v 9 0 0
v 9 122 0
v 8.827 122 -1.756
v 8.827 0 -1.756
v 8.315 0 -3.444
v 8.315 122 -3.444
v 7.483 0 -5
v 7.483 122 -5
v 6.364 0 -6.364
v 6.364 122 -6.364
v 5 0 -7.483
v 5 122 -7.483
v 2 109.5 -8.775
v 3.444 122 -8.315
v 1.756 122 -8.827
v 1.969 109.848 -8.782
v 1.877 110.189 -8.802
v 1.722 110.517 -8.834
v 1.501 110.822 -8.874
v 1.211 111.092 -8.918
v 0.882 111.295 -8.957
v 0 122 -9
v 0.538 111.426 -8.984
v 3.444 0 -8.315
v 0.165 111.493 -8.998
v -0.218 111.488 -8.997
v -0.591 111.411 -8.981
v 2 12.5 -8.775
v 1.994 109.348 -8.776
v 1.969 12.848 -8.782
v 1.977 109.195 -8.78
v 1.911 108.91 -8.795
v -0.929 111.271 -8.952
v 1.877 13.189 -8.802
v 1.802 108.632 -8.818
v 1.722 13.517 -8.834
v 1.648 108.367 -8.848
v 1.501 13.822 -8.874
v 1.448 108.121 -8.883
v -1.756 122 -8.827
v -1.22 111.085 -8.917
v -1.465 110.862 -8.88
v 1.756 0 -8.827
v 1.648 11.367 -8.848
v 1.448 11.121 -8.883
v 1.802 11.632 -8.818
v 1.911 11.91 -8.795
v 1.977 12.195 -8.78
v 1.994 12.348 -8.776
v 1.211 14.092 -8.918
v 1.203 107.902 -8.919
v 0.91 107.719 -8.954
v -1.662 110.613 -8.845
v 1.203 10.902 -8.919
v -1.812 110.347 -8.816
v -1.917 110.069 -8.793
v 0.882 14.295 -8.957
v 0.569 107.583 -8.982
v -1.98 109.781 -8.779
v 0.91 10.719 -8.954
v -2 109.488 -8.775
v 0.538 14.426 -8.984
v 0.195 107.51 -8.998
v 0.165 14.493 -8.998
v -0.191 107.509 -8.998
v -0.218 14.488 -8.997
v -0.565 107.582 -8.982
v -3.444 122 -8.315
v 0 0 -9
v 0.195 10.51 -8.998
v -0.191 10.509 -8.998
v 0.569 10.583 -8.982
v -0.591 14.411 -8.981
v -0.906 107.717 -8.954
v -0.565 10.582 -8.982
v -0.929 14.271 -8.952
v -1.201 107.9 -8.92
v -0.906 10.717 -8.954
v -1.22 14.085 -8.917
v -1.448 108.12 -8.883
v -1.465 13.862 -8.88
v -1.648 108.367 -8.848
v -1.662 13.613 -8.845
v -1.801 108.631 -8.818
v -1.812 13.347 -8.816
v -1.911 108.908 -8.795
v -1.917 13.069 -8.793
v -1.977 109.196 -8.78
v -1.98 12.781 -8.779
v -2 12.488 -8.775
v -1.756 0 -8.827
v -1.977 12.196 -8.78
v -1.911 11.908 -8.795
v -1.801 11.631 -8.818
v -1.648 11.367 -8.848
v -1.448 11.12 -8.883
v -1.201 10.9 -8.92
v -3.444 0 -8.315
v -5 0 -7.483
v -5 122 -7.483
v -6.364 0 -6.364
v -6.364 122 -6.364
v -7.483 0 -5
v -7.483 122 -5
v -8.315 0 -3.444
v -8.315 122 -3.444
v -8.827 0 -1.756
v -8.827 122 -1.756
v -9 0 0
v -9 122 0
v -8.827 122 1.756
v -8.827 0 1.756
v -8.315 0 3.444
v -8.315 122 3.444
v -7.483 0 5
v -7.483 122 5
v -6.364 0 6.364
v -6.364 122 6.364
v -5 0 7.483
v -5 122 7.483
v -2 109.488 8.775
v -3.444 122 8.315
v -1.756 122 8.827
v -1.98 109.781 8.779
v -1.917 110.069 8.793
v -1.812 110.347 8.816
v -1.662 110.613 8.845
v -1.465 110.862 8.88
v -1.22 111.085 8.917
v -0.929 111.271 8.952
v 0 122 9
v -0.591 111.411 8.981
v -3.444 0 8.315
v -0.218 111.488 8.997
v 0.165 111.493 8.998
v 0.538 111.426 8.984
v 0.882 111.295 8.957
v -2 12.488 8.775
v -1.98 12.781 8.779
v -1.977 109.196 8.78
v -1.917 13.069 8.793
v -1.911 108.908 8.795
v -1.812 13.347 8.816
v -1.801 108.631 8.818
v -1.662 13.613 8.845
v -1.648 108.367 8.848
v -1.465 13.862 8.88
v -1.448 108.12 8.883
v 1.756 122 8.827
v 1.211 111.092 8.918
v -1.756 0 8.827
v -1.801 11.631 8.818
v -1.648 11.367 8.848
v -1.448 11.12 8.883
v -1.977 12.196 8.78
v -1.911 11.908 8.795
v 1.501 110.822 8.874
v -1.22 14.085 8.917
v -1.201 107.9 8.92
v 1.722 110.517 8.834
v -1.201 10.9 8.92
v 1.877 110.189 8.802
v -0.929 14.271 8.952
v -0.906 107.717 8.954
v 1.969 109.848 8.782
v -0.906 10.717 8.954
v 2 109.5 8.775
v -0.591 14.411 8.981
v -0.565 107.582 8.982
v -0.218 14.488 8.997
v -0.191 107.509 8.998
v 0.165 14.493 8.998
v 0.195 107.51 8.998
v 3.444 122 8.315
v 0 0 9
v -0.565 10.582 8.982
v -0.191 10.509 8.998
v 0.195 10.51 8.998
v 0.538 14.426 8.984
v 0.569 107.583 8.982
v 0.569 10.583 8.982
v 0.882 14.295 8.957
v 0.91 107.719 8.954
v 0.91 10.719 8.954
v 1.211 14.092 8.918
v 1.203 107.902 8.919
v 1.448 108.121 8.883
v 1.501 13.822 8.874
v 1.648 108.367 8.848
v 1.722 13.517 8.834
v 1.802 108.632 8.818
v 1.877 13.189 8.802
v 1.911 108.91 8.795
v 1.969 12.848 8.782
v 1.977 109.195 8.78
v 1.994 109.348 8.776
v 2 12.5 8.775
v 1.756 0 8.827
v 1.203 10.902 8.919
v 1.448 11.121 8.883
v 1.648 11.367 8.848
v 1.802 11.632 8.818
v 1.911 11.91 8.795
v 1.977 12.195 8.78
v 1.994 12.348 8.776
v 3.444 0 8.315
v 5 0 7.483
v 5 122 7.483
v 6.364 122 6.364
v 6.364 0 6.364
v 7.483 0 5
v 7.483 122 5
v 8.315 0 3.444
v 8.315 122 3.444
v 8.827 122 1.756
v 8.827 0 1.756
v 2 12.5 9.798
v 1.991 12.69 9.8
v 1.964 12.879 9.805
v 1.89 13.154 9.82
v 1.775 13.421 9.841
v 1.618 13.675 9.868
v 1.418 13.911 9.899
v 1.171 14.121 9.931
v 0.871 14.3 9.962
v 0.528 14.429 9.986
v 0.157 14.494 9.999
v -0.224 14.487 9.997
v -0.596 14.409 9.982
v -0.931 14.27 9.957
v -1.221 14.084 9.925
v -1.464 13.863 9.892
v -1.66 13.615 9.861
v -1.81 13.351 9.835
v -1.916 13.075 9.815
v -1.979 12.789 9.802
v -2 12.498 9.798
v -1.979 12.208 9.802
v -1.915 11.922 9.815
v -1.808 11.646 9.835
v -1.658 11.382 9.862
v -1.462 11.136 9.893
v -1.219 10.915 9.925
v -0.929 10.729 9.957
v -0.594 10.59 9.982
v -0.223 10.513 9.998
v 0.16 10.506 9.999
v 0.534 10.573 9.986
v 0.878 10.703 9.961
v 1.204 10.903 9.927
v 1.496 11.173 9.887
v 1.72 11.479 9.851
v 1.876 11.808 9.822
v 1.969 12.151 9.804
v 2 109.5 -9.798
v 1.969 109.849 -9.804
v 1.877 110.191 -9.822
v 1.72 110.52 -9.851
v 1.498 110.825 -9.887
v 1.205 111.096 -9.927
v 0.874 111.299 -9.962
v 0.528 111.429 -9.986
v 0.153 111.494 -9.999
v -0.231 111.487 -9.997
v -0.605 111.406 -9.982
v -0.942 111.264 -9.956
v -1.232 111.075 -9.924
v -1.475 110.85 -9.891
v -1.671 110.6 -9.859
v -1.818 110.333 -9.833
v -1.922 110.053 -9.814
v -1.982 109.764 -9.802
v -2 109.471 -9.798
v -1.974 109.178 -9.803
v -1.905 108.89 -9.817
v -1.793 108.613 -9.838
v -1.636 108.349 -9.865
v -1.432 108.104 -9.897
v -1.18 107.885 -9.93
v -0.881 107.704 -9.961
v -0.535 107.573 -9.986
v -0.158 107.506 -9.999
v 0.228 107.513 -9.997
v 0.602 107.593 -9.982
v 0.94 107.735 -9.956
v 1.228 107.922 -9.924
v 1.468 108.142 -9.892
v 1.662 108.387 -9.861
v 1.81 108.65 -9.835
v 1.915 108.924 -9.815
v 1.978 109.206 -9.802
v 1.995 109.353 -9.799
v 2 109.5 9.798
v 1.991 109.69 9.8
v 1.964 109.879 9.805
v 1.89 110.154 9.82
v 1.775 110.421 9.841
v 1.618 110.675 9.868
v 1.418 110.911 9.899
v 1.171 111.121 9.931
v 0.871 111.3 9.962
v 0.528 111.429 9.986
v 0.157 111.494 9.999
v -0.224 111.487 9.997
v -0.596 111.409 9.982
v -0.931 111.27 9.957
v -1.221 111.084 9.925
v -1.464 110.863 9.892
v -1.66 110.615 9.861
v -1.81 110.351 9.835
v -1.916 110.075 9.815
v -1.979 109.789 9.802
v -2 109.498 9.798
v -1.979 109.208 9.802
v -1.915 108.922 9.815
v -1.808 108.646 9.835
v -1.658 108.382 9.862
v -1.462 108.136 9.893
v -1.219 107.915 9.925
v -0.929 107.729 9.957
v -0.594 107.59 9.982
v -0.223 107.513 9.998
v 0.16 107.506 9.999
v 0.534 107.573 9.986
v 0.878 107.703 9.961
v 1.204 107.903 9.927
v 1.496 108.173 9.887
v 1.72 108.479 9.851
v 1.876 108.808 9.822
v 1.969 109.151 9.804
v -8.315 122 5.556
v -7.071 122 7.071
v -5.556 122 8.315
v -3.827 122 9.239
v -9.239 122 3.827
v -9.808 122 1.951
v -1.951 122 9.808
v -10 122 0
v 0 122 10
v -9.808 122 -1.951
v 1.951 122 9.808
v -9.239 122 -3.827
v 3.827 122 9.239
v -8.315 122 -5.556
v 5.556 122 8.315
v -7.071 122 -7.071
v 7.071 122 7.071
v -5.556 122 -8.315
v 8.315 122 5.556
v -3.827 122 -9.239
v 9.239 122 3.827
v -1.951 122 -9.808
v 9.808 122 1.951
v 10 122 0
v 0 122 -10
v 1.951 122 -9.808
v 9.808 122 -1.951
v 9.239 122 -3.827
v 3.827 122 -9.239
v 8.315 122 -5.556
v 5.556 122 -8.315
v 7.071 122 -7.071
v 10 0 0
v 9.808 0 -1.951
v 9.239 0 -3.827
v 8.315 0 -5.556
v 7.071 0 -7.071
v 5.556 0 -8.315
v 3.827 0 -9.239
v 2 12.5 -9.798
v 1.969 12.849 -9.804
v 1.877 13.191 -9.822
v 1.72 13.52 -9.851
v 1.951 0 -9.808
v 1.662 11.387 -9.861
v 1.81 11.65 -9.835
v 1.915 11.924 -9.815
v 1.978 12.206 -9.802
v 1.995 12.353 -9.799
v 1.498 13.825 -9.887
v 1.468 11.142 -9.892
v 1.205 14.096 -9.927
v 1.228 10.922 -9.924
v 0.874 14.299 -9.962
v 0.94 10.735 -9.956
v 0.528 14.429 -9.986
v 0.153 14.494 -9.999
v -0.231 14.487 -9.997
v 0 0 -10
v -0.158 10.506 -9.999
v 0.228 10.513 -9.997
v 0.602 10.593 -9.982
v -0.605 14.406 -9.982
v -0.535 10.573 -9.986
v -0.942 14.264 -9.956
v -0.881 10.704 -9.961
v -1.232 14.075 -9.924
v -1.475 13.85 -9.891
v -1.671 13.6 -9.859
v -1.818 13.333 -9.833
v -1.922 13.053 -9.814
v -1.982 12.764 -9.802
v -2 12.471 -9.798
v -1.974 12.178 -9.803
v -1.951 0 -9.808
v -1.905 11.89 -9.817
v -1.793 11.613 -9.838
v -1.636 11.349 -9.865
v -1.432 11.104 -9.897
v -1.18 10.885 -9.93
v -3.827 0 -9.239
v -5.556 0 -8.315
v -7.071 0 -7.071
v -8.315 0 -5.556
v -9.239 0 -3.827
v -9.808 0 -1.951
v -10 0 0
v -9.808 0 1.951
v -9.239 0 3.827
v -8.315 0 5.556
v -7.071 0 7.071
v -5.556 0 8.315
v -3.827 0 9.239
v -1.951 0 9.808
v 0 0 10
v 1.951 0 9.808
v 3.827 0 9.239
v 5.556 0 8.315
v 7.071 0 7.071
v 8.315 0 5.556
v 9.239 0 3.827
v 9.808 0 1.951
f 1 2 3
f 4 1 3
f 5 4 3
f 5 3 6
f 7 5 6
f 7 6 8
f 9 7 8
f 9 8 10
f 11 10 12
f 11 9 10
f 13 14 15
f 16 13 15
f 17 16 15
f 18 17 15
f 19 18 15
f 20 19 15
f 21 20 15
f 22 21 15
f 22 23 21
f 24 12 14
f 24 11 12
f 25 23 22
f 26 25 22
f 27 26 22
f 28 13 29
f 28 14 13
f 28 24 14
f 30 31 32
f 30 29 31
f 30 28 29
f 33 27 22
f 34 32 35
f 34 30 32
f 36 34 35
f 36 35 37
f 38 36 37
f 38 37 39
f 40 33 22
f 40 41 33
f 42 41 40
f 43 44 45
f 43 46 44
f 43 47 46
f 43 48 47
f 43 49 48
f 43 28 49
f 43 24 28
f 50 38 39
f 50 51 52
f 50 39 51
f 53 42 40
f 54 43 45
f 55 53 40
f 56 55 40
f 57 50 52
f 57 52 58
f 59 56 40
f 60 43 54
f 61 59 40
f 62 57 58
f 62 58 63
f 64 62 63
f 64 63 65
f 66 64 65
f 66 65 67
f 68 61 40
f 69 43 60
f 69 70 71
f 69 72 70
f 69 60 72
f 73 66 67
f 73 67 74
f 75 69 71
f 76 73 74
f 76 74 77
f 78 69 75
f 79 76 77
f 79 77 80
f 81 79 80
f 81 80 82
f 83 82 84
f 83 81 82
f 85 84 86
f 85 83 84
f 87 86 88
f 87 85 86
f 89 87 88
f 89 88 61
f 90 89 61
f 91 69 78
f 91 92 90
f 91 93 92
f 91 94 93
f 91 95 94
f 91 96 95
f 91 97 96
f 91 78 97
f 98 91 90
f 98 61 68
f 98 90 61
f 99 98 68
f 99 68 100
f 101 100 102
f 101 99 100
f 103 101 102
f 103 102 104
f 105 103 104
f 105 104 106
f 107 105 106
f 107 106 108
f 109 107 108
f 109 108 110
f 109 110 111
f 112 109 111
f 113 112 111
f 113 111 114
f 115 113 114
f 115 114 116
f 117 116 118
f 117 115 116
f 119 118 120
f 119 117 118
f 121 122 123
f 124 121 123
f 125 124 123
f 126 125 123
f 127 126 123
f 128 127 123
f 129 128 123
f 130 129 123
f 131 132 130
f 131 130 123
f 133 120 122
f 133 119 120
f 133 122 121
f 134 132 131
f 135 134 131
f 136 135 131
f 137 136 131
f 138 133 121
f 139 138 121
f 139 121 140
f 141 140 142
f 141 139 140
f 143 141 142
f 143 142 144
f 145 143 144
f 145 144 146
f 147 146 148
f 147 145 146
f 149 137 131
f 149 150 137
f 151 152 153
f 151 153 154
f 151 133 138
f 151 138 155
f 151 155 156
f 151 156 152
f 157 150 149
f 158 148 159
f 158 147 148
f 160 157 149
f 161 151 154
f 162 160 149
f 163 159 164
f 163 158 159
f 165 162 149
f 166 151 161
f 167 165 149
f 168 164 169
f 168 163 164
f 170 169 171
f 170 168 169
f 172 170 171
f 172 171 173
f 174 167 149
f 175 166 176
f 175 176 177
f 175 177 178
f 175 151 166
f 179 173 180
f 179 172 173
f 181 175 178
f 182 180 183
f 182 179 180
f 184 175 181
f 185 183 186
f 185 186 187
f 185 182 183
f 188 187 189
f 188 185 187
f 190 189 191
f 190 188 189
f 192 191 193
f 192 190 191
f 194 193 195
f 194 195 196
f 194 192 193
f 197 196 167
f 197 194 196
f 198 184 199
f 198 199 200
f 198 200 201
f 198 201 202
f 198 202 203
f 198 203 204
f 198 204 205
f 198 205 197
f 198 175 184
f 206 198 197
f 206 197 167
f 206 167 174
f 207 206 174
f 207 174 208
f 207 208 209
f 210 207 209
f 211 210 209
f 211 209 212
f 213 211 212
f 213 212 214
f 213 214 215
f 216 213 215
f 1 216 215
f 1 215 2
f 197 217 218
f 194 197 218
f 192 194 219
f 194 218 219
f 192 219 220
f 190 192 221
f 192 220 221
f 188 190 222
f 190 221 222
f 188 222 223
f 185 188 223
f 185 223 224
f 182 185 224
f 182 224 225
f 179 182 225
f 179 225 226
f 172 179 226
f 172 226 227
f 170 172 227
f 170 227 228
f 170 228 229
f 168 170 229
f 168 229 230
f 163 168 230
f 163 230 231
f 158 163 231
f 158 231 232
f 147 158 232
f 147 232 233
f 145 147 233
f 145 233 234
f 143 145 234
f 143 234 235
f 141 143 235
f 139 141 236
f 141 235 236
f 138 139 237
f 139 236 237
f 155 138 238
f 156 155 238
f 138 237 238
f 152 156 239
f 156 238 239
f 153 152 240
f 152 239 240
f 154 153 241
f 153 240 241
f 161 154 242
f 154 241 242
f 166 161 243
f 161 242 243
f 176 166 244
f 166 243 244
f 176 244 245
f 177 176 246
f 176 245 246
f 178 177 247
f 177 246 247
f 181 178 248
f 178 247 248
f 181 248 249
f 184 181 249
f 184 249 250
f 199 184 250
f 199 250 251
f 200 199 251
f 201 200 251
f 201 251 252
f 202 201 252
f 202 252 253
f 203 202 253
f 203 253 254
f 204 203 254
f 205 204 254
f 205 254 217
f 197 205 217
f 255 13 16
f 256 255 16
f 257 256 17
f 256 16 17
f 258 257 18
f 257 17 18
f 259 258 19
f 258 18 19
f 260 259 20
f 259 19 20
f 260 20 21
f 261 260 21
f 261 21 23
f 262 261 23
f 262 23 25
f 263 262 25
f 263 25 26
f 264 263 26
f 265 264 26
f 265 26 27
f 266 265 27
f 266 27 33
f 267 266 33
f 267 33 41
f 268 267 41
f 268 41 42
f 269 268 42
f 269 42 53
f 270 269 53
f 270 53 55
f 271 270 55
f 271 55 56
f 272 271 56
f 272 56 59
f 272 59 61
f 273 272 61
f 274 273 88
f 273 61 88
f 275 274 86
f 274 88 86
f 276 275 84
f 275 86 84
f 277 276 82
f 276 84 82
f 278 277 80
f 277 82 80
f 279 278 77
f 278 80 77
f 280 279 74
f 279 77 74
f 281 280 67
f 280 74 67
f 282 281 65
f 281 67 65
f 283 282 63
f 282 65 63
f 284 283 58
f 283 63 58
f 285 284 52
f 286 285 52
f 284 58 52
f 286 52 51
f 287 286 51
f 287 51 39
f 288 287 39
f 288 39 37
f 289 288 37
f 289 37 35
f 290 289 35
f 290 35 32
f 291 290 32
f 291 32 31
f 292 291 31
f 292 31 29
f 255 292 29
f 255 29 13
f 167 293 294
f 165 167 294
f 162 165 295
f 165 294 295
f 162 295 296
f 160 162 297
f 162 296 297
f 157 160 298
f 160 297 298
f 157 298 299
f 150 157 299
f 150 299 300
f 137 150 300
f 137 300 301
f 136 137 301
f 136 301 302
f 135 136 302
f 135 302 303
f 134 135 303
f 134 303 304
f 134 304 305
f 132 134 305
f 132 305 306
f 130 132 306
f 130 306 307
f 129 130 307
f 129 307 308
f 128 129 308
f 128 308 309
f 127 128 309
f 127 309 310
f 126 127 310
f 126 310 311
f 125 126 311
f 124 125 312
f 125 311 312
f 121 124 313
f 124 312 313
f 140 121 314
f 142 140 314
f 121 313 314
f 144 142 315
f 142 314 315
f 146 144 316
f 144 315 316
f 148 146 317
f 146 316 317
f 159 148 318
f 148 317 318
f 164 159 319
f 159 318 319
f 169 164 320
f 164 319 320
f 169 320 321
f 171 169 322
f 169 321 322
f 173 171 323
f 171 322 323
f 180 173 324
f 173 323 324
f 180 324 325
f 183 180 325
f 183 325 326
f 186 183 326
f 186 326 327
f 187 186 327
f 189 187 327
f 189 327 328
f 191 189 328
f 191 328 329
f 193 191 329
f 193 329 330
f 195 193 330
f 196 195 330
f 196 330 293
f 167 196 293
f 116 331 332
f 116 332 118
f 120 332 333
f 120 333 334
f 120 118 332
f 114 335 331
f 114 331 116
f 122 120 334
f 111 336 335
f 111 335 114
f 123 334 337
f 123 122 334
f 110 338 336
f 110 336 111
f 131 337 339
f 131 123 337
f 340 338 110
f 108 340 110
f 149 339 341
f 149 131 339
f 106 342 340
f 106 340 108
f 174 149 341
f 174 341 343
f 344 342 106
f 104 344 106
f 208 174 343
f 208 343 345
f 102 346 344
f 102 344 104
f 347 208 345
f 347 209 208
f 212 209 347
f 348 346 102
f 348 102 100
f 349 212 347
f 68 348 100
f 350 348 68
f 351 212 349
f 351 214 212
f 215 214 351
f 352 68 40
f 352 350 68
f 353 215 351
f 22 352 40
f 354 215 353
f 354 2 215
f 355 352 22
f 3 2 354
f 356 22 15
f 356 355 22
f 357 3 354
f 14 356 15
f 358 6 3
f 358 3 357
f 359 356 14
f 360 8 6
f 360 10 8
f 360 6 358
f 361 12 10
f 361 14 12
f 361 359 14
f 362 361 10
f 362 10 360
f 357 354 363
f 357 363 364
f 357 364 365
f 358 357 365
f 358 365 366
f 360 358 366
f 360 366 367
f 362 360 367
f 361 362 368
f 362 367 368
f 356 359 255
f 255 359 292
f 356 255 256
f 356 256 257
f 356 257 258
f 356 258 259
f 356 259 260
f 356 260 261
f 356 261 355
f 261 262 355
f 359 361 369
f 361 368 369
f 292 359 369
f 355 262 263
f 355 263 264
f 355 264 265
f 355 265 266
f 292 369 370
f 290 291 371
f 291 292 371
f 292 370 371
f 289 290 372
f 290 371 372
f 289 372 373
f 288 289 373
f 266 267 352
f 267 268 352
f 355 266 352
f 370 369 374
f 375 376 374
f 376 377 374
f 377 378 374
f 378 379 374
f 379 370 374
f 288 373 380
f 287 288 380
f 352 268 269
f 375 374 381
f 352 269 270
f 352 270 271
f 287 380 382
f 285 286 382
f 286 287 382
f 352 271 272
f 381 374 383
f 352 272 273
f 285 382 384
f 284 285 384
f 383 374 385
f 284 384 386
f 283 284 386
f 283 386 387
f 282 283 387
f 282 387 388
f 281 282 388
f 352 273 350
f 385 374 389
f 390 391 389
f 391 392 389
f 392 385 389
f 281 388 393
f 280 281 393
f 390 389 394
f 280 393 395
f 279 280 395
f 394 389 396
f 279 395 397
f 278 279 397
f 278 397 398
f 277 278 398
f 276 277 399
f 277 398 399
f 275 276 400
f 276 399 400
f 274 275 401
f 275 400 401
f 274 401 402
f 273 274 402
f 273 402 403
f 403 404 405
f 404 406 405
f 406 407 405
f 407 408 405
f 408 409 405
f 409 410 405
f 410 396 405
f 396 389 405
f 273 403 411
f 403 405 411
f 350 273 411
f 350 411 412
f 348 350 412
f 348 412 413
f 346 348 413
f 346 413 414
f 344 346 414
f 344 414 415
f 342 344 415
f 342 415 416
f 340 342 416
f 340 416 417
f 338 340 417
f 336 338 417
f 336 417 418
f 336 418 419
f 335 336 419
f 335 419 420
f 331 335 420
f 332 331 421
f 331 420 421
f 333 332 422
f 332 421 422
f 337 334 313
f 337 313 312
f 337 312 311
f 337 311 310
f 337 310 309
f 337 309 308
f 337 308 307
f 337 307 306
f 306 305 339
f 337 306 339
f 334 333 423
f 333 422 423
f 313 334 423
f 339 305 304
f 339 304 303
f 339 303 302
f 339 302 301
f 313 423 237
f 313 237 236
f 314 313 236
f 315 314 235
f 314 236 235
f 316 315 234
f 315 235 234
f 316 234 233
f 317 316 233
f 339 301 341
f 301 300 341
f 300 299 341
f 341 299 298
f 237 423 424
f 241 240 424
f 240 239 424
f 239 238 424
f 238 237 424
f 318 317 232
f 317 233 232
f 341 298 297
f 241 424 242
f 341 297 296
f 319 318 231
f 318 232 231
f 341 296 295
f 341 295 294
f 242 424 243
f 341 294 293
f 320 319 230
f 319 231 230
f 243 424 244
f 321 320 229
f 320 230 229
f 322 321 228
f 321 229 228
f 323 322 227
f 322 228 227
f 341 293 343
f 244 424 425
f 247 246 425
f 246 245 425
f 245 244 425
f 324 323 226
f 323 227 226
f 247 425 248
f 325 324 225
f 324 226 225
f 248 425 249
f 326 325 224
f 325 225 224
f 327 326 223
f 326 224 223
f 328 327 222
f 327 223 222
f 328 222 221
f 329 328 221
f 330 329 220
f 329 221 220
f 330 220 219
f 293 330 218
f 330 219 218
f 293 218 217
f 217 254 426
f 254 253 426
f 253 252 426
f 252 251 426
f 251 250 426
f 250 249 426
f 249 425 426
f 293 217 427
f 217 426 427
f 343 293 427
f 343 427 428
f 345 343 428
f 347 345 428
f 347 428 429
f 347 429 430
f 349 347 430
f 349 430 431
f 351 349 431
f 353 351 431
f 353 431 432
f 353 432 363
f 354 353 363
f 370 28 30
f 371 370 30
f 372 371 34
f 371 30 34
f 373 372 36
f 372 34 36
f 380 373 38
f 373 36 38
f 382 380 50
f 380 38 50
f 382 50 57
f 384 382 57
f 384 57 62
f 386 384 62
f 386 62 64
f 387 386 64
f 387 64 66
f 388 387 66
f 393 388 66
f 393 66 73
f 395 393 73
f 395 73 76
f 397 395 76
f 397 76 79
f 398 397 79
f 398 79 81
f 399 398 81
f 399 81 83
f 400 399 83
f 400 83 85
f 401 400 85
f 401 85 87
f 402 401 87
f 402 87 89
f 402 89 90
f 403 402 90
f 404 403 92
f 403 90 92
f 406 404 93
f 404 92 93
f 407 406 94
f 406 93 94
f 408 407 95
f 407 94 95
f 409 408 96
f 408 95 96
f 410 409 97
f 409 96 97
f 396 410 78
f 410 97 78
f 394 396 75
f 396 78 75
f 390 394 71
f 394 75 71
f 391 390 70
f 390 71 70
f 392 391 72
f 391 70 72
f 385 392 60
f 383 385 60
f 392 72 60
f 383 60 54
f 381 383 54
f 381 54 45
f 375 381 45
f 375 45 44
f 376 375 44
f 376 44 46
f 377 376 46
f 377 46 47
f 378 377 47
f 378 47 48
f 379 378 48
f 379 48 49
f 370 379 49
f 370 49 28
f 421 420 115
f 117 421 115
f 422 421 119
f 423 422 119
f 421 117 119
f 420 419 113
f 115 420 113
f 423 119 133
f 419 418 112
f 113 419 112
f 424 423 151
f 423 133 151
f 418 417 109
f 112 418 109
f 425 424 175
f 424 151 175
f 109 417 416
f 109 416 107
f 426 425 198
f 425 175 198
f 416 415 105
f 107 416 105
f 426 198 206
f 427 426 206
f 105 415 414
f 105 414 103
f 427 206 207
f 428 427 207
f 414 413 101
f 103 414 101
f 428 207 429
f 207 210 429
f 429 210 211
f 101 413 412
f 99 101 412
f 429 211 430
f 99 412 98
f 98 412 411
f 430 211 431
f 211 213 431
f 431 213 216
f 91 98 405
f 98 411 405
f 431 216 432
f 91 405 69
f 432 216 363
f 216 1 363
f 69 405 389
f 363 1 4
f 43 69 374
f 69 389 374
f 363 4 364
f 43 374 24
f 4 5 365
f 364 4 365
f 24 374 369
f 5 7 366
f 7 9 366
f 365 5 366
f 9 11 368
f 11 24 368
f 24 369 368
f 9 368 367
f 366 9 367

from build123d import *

# Parameters (mm, degrees)
SKETCH1_R           = 10
SKETCH1_R_2         = 9
BOSS_EXTRUDE1_DEPTH = 122
SKETCH3_R           = 2
CUT_EXTRUDE2_DEPTH  = 21


with BuildPart() as part:
    # Sketch1 → Boss-Extrude1 (new body)
    with BuildSketch(Plane(origin=(0, 0, 0), x_dir=(1, 0, 0), z_dir=(0, 1, 0))):
        Circle(SKETCH1_R)
        Circle(SKETCH1_R_2, mode=Mode.SUBTRACT)
    extrude(amount=BOSS_EXTRUDE1_DEPTH)

    # Sketch3 → Cut-Extrude2 (cut, through all)
    with BuildSketch(Plane.XY.offset(10)):
        with Locations((0, 109.5)):
            Circle(SKETCH3_R)
        with Locations((0, 12.5)):
            Circle(SKETCH3_R)
    extrude(amount=-CUT_EXTRUDE2_DEPTH, mode=Mode.SUBTRACT)


solid = part.part
